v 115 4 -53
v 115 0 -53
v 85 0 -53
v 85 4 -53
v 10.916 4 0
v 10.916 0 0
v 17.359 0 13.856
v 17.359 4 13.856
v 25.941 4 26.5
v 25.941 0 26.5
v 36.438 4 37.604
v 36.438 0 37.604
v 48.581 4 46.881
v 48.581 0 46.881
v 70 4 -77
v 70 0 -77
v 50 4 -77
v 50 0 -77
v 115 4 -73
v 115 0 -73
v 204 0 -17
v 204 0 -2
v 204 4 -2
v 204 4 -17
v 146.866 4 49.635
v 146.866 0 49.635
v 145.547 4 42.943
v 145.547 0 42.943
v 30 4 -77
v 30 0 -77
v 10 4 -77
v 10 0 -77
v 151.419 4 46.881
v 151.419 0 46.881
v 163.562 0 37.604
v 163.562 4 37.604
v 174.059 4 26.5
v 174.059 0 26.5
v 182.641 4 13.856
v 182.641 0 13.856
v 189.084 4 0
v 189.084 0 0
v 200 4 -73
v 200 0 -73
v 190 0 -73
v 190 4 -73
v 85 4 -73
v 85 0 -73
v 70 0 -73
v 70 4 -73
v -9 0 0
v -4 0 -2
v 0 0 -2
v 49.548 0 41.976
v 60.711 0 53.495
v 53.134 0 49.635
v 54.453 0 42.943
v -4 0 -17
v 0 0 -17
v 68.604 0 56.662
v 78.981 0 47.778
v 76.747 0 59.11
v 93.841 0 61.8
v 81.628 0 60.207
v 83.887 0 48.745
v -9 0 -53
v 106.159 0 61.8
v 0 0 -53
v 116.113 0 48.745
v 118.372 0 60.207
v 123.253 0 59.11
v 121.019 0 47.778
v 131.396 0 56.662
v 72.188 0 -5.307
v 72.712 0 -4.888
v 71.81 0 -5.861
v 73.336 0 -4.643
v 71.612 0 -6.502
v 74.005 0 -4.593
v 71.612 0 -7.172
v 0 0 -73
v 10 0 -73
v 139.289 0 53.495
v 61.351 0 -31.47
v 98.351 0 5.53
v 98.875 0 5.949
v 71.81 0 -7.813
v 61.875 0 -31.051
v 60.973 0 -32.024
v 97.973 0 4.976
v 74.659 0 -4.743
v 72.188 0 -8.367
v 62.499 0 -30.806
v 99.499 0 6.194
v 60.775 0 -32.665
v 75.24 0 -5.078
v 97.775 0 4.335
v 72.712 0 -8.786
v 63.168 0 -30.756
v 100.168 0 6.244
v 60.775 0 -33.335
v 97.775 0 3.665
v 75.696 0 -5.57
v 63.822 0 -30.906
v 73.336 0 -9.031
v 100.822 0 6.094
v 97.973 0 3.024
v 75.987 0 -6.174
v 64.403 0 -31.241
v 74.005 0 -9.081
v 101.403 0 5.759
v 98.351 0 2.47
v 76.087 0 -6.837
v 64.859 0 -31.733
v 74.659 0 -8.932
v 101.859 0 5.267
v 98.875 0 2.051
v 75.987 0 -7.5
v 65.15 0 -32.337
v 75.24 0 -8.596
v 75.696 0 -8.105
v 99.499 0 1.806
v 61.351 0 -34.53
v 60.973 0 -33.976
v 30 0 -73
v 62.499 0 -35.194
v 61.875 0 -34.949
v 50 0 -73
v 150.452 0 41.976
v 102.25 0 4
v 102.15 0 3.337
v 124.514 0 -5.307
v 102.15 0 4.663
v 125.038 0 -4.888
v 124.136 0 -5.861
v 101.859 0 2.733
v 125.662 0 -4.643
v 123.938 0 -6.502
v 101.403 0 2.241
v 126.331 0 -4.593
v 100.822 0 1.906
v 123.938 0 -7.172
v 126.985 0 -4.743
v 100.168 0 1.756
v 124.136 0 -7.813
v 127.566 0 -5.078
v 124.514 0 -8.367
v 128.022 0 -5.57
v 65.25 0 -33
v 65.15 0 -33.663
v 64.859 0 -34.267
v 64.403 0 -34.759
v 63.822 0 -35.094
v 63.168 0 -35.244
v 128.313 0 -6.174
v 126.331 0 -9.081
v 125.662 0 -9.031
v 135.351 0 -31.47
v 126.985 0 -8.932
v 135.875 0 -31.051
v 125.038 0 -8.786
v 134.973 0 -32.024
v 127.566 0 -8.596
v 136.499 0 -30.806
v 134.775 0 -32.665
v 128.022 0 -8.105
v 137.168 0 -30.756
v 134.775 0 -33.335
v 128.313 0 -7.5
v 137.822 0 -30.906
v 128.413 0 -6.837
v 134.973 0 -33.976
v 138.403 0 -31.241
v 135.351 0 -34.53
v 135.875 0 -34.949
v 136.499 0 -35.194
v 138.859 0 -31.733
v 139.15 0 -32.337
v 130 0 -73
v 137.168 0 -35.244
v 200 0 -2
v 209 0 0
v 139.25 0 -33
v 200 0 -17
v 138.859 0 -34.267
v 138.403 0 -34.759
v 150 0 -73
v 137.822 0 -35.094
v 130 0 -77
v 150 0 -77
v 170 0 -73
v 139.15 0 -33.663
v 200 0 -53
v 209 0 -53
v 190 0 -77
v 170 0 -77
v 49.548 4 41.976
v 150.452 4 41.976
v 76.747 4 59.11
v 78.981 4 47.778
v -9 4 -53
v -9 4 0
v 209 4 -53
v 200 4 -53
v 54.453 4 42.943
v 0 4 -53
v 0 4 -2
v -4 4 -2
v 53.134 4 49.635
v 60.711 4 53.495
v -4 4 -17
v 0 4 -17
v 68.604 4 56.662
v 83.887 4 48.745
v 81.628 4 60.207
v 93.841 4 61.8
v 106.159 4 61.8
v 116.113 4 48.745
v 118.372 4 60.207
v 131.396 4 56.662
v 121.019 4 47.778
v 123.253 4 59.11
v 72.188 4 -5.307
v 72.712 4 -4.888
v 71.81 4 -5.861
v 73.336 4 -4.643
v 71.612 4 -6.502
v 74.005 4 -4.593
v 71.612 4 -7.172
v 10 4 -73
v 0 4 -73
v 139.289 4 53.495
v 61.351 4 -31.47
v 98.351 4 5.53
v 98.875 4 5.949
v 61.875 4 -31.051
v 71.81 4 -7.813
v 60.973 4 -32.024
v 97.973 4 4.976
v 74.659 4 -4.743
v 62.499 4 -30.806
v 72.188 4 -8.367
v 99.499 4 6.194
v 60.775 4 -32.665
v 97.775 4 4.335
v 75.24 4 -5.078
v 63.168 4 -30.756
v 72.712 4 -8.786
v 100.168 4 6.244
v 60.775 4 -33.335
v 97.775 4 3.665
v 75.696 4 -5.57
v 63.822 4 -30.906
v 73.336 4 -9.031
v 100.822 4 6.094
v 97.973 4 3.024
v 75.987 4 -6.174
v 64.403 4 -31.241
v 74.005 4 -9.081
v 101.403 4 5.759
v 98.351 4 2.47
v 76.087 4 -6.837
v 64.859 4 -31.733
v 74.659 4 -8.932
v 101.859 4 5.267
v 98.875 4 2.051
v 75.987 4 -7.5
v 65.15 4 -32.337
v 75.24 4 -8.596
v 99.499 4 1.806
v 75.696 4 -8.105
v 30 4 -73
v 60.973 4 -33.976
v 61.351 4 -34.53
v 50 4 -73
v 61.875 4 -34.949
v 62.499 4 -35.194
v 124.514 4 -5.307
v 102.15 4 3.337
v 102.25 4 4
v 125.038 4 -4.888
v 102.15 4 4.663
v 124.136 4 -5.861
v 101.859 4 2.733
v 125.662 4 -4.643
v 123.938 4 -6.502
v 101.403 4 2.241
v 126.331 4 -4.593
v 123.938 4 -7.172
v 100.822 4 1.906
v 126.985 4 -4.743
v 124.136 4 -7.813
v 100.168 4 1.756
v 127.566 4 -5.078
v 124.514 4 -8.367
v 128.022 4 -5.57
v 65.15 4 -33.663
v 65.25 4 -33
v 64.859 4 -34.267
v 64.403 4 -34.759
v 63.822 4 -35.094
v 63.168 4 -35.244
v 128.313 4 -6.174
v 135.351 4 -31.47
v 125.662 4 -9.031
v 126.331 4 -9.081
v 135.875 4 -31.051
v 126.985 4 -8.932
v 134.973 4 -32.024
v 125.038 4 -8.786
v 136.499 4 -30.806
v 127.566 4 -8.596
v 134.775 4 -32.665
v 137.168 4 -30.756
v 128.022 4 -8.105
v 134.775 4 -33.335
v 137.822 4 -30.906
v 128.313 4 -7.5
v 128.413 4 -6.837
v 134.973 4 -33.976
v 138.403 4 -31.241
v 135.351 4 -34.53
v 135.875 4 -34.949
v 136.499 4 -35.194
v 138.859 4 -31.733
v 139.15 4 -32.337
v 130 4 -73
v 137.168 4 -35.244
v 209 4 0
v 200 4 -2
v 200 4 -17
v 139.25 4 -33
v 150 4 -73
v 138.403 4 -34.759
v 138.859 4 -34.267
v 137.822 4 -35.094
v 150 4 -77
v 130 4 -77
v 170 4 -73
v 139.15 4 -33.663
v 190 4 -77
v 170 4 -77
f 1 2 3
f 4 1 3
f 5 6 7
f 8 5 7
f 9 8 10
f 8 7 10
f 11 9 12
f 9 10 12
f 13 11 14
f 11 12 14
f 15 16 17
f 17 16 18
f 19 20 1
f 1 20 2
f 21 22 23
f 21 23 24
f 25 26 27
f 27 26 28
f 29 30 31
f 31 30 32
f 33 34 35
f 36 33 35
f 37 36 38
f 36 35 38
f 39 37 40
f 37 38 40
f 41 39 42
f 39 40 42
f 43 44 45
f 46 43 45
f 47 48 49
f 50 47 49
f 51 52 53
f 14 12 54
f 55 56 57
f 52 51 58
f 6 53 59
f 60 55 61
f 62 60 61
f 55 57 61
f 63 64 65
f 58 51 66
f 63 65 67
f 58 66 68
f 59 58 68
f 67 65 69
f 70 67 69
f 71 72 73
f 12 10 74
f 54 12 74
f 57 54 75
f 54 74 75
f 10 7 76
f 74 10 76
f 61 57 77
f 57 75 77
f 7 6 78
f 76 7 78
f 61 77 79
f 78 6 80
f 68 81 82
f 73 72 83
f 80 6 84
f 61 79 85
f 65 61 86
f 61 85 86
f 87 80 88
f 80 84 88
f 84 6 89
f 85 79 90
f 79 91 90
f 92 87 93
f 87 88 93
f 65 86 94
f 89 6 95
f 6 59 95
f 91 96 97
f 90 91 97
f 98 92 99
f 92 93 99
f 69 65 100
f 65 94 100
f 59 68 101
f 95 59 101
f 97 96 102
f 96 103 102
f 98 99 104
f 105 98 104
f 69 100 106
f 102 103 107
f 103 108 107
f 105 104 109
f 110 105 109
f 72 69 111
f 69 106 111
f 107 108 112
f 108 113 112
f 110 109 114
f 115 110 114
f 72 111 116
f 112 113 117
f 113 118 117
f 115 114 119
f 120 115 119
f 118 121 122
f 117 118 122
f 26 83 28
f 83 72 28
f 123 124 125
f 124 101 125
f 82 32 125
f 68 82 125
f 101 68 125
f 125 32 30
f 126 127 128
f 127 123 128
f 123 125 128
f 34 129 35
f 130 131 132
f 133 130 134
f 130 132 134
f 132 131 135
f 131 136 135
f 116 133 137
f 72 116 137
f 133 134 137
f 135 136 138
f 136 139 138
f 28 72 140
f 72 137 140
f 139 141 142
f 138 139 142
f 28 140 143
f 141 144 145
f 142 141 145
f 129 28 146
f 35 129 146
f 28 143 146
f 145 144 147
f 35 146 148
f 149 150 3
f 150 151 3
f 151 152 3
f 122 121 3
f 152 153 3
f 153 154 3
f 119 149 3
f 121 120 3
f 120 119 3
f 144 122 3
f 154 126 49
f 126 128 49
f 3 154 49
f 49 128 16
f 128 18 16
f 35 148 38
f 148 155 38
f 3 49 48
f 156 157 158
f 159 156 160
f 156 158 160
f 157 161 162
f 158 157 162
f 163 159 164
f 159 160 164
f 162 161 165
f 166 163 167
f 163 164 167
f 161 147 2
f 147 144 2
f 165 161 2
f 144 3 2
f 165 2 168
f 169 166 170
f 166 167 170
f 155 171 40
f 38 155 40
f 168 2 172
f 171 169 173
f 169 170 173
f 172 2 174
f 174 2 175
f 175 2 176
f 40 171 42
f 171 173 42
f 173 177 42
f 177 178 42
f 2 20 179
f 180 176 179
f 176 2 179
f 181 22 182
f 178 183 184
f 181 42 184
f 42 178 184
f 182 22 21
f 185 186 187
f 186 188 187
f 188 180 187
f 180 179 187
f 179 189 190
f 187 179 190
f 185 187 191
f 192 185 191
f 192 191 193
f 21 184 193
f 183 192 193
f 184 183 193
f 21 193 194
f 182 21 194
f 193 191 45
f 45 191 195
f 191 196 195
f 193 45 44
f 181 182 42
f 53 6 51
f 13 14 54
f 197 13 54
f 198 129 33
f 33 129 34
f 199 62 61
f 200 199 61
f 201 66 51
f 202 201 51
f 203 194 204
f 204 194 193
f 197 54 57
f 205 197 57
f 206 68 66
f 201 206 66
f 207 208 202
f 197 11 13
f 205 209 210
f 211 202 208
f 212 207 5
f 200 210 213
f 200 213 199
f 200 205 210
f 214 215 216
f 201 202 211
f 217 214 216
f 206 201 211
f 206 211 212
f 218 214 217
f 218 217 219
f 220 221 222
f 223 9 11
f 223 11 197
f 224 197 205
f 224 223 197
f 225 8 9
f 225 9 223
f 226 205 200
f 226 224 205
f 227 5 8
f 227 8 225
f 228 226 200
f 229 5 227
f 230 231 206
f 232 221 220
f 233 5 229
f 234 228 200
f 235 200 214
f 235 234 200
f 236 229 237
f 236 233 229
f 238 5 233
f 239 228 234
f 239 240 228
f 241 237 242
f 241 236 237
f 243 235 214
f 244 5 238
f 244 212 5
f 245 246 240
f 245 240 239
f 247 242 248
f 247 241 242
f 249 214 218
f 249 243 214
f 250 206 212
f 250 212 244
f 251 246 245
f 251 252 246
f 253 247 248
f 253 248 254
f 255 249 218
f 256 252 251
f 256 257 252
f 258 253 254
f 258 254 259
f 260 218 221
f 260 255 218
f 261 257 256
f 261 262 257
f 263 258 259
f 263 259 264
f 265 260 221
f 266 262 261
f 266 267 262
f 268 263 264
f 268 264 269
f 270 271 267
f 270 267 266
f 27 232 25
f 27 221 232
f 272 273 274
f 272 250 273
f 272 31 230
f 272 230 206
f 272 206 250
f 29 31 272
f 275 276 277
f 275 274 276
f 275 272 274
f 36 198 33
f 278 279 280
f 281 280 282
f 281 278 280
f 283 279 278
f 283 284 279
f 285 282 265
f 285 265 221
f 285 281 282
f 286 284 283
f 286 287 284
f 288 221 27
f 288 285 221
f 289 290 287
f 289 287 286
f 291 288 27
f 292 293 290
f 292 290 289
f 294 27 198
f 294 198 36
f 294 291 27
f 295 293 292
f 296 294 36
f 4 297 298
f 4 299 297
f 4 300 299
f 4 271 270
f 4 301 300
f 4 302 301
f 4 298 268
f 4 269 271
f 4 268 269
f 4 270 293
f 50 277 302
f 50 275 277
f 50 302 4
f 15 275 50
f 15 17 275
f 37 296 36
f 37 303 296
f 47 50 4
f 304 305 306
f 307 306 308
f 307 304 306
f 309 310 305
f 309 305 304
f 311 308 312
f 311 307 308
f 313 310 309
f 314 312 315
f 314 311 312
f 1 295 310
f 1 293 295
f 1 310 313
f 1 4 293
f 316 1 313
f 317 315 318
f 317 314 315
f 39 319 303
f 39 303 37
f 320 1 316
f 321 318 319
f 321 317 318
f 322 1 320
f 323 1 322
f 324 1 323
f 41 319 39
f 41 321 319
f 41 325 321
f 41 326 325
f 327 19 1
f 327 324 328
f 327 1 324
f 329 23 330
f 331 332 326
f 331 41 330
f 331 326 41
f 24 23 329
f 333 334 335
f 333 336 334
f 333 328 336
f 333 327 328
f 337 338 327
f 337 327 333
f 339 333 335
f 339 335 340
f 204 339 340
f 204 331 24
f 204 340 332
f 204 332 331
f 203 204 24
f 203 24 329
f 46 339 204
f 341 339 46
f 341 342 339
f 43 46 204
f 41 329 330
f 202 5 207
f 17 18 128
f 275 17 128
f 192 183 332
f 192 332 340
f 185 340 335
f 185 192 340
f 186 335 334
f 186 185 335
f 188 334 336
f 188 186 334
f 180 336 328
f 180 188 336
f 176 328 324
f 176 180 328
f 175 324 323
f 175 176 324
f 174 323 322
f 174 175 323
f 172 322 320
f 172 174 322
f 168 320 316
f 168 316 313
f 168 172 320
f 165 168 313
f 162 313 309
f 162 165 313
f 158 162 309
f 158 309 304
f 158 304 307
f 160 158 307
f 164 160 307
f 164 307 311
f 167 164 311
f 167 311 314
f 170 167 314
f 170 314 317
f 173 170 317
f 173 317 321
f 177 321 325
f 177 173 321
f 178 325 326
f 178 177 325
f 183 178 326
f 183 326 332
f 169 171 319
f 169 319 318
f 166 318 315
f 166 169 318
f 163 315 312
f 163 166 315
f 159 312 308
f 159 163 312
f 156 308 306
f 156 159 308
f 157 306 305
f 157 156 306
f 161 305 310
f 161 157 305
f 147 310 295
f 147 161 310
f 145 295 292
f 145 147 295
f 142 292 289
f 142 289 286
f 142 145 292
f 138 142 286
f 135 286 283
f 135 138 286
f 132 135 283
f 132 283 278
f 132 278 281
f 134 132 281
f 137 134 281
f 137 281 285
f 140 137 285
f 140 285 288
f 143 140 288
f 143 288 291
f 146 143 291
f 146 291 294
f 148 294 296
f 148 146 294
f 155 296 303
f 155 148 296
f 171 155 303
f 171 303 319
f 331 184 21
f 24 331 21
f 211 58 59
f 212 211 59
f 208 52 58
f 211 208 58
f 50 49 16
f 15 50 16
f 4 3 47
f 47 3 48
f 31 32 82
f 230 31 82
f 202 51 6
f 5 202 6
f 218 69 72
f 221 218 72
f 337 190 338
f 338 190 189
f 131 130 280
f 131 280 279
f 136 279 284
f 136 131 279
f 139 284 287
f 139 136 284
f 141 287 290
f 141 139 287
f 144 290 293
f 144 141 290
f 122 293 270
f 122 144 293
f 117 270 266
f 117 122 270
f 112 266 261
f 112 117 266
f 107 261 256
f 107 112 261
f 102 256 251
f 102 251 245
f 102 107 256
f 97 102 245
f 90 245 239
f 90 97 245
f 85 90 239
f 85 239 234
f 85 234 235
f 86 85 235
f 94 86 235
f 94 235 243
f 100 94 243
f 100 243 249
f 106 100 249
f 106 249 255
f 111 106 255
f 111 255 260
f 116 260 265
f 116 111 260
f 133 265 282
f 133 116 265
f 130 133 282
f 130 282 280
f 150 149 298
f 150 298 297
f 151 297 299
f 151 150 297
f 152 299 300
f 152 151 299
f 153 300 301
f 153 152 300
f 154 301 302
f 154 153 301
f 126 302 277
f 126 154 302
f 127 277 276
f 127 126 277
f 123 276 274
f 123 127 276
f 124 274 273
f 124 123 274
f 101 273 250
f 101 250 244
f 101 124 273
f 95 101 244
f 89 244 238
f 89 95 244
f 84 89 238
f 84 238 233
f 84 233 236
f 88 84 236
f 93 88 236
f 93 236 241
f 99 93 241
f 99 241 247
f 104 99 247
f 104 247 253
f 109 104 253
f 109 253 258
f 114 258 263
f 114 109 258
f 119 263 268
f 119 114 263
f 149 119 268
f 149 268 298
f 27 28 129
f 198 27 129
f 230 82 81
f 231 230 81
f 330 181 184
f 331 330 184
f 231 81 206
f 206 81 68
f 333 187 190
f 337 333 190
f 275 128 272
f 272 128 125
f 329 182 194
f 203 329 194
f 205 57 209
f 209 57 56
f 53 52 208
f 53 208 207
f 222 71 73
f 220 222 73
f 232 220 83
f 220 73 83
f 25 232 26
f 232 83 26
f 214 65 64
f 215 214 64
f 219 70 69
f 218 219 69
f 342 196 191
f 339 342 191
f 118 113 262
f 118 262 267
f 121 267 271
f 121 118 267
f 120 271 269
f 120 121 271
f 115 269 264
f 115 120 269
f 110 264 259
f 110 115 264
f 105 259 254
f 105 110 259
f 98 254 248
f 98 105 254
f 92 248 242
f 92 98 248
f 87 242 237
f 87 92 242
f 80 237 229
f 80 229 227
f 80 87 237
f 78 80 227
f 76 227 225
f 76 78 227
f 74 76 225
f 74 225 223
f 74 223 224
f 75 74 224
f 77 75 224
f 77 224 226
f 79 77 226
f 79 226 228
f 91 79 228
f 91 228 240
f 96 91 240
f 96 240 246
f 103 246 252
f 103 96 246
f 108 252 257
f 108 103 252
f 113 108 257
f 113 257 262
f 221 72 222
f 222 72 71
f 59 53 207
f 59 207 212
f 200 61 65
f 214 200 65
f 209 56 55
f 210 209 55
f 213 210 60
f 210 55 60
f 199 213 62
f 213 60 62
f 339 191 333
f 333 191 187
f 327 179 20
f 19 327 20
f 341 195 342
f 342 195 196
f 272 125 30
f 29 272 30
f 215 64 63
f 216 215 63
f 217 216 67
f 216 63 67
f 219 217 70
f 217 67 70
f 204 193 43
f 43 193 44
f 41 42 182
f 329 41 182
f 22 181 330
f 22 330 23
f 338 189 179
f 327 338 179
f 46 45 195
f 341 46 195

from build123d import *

# Parameters (mm, degrees)
SKICA1_W                = 4
SKICA1_H                = 15
SKICA1_R                = 2.25
P_IDAT_VYSUNUT_M1_DEPTH = 4


with BuildPart() as part:
    # Skica1 → Přidat vysunutím1 (new body)
    with BuildSketch(Plane(origin=(0, 0, 0), x_dir=(1, 0, 0), z_dir=(0, 1, 0))):
        with BuildLine():
            ThreePointArc((10.915770195, 0), (25.940686176, -26.499731394), (48.580654593, -46.881480444))
            Line((48.580654593, -46.881480444), (49.547625125, -41.975874672))
            Line((49.547625125, -41.975874672), (54.453230897, -42.942845204))
            Line((54.453230897, -42.942845204), (53.134056197, -49.635242551))
            ThreePointArc((53.134056197, -49.635242551), (64.622092485, -55.166907964), (76.747418364, -59.110354723))
            Line((76.747418364, -59.110354723), (78.981259757, -47.777697862))
            Line((78.981259757, -47.777697862), (83.886865529, -48.744668394))
            Line((83.886865529, -48.744668394), (81.627559896, -60.206509669))
            ThreePointArc((81.627559896, -60.206509669), (100, -62), (118.372440104, -60.206509669))
            Line((118.372440104, -60.206509669), (116.113134471, -48.744668394))
            Line((116.113134471, -48.744668394), (121.018740243, -47.777697862))
            Line((121.018740243, -47.777697862), (123.252581636, -59.110354723))
            ThreePointArc((123.252581636, -59.110354723), (135.377907515, -55.166907964), (146.865943803, -49.635242551))
            Line((146.865943803, -49.635242551), (145.546769103, -42.942845204))
            Line((145.546769103, -42.942845204), (150.452374875, -41.975874672))
            Line((150.452374875, -41.975874672), (151.419345407, -46.881480444))
            ThreePointArc((151.419345407, -46.881480444), (174.059313824, -26.499731394), (189.084229805, 0))
            Line((189.084229805, 0), (209, 0))
            Line((209, 0), (209, 53))
            Line((209, 53), (200, 53))
            Line((200, 53), (200, 73))
            Line((200, 73), (190, 73))
            Line((190, 73), (190, 77))
            Line((190, 77), (170, 77))
            Line((170, 77), (170, 73))
            Line((170, 73), (150, 73))
            Line((150, 73), (150, 77))
            Line((150, 77), (130, 77))
            Line((130, 77), (130, 73))
            Line((130, 73), (115, 73))
            Line((115, 73), (115, 53))
            Line((115, 53), (85, 53))
            Line((85, 53), (85, 73))
            Line((85, 73), (70, 73))
            Line((70, 73), (70, 77))
            Line((70, 77), (50, 77))
            Line((50, 77), (50, 73))
            Line((50, 73), (30, 73))
            Line((30, 73), (30, 77))
            Line((30, 77), (10, 77))
            Line((10, 77), (10, 73))
            Line((10, 73), (0, 73))
            Line((0, 73), (0, 53))
            Line((0, 53), (-9, 53))
            Line((-9, 53), (-9, 0))
            Line((-9, 0), (10.915770195, 0))
        make_face()
        with Locations((-2, 9.5)):
            Rectangle(SKICA1_W, SKICA1_H, mode=Mode.SUBTRACT)
        with Locations((73.837049096, 6.837049096)):
            Circle(SKICA1_R, mode=Mode.SUBTRACT)
        with Locations((100, -4)):
            Circle(SKICA1_R, mode=Mode.SUBTRACT)
        with Locations((126.162950904, 6.837049096)):
            Circle(SKICA1_R, mode=Mode.SUBTRACT)
        with Locations((202, 9.5)):
            Rectangle(SKICA1_W, SKICA1_H, mode=Mode.SUBTRACT)
        with Locations((63, 33)):
            Circle(SKICA1_R, mode=Mode.SUBTRACT)
        with Locations((137, 33)):
            Circle(SKICA1_R, mode=Mode.SUBTRACT)
    extrude(amount=P_IDAT_VYSUNUT_M1_DEPTH)


solid = part.part
